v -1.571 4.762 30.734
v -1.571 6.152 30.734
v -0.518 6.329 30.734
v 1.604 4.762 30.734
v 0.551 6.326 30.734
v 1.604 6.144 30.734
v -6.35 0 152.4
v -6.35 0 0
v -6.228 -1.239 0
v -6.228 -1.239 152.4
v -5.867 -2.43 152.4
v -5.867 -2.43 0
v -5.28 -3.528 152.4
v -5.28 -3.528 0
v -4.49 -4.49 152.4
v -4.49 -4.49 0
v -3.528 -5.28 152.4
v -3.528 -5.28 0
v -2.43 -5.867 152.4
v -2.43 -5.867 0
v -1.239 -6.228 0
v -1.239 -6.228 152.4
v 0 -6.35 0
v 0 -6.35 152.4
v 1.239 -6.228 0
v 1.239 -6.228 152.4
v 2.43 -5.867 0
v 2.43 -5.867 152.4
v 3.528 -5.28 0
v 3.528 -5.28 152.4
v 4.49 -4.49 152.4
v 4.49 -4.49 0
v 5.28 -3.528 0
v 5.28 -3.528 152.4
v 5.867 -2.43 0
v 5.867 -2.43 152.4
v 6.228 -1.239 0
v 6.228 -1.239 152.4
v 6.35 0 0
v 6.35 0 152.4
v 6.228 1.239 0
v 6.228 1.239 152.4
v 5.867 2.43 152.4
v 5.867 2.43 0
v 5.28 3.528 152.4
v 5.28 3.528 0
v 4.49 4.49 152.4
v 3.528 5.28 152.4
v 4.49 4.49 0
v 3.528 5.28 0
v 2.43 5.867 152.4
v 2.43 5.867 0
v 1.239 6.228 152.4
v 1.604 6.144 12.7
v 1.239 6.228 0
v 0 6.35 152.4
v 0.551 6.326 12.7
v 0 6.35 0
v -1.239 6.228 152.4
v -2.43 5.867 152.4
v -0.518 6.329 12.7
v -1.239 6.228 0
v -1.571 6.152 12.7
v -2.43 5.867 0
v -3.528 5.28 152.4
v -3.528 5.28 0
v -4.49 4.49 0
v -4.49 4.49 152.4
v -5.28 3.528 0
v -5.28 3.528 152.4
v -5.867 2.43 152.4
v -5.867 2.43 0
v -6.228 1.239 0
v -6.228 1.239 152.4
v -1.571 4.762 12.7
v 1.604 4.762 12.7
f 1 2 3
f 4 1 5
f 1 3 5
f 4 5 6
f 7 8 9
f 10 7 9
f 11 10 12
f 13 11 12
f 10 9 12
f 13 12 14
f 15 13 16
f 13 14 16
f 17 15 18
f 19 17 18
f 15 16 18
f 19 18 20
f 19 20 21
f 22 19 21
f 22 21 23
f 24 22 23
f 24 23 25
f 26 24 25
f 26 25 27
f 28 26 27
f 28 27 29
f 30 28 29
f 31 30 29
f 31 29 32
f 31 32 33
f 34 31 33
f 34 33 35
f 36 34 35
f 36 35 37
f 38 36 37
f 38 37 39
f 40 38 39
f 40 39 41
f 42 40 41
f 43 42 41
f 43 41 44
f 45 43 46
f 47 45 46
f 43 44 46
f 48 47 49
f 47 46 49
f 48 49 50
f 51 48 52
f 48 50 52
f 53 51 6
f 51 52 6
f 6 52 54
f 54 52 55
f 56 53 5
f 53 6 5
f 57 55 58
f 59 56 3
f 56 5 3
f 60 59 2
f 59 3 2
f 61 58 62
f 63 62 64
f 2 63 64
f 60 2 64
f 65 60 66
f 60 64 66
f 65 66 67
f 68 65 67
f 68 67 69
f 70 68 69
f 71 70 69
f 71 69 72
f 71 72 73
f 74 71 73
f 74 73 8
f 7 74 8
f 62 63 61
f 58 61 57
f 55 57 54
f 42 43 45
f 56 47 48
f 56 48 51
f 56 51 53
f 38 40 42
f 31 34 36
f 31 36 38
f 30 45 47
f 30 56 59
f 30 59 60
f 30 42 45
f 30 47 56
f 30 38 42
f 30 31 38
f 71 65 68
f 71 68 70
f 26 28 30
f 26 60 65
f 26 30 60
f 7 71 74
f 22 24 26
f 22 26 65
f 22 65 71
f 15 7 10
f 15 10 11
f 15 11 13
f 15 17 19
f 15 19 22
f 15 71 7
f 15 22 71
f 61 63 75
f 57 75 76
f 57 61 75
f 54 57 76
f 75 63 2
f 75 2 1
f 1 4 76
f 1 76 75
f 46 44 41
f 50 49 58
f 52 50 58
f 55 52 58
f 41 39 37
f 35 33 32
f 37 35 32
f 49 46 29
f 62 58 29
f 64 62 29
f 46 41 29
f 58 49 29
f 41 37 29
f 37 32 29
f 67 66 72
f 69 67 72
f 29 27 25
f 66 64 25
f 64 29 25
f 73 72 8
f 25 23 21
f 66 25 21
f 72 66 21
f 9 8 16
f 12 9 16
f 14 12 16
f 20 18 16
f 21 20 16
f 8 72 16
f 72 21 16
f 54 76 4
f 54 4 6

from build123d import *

# Parameters (mm, degrees)
SKETCH1_R           = 6.35
BOSS_EXTRUDE1_DEPTH = 152.4
CUT_EXTRUDE1_DEPTH  = 18.034


with BuildPart() as part:
    # Sketch1 → Boss-Extrude1 (new body)
    with BuildSketch(Plane.XY):
        with Locations(Location((0, 0, 0), (0, 0, 180))):
            Circle(SKETCH1_R)
    extrude(amount=BOSS_EXTRUDE1_DEPTH)

    # Sketch2 → Cut-Extrude1 (cut)
    with BuildSketch(Plane(origin=(0, 0, 12.7), x_dir=(-1, 0, 0), z_dir=(0, 0, -1))):
        Polygon((1.571433325, 4.7625), (-0.016066675, 4.7625), (-1.603566675, 4.7625), (-1.603566675, 7.9375), (1.571433325, 7.9375), align=None)
    extrude(amount=-CUT_EXTRUDE1_DEPTH, mode=Mode.SUBTRACT)


solid = part.part
